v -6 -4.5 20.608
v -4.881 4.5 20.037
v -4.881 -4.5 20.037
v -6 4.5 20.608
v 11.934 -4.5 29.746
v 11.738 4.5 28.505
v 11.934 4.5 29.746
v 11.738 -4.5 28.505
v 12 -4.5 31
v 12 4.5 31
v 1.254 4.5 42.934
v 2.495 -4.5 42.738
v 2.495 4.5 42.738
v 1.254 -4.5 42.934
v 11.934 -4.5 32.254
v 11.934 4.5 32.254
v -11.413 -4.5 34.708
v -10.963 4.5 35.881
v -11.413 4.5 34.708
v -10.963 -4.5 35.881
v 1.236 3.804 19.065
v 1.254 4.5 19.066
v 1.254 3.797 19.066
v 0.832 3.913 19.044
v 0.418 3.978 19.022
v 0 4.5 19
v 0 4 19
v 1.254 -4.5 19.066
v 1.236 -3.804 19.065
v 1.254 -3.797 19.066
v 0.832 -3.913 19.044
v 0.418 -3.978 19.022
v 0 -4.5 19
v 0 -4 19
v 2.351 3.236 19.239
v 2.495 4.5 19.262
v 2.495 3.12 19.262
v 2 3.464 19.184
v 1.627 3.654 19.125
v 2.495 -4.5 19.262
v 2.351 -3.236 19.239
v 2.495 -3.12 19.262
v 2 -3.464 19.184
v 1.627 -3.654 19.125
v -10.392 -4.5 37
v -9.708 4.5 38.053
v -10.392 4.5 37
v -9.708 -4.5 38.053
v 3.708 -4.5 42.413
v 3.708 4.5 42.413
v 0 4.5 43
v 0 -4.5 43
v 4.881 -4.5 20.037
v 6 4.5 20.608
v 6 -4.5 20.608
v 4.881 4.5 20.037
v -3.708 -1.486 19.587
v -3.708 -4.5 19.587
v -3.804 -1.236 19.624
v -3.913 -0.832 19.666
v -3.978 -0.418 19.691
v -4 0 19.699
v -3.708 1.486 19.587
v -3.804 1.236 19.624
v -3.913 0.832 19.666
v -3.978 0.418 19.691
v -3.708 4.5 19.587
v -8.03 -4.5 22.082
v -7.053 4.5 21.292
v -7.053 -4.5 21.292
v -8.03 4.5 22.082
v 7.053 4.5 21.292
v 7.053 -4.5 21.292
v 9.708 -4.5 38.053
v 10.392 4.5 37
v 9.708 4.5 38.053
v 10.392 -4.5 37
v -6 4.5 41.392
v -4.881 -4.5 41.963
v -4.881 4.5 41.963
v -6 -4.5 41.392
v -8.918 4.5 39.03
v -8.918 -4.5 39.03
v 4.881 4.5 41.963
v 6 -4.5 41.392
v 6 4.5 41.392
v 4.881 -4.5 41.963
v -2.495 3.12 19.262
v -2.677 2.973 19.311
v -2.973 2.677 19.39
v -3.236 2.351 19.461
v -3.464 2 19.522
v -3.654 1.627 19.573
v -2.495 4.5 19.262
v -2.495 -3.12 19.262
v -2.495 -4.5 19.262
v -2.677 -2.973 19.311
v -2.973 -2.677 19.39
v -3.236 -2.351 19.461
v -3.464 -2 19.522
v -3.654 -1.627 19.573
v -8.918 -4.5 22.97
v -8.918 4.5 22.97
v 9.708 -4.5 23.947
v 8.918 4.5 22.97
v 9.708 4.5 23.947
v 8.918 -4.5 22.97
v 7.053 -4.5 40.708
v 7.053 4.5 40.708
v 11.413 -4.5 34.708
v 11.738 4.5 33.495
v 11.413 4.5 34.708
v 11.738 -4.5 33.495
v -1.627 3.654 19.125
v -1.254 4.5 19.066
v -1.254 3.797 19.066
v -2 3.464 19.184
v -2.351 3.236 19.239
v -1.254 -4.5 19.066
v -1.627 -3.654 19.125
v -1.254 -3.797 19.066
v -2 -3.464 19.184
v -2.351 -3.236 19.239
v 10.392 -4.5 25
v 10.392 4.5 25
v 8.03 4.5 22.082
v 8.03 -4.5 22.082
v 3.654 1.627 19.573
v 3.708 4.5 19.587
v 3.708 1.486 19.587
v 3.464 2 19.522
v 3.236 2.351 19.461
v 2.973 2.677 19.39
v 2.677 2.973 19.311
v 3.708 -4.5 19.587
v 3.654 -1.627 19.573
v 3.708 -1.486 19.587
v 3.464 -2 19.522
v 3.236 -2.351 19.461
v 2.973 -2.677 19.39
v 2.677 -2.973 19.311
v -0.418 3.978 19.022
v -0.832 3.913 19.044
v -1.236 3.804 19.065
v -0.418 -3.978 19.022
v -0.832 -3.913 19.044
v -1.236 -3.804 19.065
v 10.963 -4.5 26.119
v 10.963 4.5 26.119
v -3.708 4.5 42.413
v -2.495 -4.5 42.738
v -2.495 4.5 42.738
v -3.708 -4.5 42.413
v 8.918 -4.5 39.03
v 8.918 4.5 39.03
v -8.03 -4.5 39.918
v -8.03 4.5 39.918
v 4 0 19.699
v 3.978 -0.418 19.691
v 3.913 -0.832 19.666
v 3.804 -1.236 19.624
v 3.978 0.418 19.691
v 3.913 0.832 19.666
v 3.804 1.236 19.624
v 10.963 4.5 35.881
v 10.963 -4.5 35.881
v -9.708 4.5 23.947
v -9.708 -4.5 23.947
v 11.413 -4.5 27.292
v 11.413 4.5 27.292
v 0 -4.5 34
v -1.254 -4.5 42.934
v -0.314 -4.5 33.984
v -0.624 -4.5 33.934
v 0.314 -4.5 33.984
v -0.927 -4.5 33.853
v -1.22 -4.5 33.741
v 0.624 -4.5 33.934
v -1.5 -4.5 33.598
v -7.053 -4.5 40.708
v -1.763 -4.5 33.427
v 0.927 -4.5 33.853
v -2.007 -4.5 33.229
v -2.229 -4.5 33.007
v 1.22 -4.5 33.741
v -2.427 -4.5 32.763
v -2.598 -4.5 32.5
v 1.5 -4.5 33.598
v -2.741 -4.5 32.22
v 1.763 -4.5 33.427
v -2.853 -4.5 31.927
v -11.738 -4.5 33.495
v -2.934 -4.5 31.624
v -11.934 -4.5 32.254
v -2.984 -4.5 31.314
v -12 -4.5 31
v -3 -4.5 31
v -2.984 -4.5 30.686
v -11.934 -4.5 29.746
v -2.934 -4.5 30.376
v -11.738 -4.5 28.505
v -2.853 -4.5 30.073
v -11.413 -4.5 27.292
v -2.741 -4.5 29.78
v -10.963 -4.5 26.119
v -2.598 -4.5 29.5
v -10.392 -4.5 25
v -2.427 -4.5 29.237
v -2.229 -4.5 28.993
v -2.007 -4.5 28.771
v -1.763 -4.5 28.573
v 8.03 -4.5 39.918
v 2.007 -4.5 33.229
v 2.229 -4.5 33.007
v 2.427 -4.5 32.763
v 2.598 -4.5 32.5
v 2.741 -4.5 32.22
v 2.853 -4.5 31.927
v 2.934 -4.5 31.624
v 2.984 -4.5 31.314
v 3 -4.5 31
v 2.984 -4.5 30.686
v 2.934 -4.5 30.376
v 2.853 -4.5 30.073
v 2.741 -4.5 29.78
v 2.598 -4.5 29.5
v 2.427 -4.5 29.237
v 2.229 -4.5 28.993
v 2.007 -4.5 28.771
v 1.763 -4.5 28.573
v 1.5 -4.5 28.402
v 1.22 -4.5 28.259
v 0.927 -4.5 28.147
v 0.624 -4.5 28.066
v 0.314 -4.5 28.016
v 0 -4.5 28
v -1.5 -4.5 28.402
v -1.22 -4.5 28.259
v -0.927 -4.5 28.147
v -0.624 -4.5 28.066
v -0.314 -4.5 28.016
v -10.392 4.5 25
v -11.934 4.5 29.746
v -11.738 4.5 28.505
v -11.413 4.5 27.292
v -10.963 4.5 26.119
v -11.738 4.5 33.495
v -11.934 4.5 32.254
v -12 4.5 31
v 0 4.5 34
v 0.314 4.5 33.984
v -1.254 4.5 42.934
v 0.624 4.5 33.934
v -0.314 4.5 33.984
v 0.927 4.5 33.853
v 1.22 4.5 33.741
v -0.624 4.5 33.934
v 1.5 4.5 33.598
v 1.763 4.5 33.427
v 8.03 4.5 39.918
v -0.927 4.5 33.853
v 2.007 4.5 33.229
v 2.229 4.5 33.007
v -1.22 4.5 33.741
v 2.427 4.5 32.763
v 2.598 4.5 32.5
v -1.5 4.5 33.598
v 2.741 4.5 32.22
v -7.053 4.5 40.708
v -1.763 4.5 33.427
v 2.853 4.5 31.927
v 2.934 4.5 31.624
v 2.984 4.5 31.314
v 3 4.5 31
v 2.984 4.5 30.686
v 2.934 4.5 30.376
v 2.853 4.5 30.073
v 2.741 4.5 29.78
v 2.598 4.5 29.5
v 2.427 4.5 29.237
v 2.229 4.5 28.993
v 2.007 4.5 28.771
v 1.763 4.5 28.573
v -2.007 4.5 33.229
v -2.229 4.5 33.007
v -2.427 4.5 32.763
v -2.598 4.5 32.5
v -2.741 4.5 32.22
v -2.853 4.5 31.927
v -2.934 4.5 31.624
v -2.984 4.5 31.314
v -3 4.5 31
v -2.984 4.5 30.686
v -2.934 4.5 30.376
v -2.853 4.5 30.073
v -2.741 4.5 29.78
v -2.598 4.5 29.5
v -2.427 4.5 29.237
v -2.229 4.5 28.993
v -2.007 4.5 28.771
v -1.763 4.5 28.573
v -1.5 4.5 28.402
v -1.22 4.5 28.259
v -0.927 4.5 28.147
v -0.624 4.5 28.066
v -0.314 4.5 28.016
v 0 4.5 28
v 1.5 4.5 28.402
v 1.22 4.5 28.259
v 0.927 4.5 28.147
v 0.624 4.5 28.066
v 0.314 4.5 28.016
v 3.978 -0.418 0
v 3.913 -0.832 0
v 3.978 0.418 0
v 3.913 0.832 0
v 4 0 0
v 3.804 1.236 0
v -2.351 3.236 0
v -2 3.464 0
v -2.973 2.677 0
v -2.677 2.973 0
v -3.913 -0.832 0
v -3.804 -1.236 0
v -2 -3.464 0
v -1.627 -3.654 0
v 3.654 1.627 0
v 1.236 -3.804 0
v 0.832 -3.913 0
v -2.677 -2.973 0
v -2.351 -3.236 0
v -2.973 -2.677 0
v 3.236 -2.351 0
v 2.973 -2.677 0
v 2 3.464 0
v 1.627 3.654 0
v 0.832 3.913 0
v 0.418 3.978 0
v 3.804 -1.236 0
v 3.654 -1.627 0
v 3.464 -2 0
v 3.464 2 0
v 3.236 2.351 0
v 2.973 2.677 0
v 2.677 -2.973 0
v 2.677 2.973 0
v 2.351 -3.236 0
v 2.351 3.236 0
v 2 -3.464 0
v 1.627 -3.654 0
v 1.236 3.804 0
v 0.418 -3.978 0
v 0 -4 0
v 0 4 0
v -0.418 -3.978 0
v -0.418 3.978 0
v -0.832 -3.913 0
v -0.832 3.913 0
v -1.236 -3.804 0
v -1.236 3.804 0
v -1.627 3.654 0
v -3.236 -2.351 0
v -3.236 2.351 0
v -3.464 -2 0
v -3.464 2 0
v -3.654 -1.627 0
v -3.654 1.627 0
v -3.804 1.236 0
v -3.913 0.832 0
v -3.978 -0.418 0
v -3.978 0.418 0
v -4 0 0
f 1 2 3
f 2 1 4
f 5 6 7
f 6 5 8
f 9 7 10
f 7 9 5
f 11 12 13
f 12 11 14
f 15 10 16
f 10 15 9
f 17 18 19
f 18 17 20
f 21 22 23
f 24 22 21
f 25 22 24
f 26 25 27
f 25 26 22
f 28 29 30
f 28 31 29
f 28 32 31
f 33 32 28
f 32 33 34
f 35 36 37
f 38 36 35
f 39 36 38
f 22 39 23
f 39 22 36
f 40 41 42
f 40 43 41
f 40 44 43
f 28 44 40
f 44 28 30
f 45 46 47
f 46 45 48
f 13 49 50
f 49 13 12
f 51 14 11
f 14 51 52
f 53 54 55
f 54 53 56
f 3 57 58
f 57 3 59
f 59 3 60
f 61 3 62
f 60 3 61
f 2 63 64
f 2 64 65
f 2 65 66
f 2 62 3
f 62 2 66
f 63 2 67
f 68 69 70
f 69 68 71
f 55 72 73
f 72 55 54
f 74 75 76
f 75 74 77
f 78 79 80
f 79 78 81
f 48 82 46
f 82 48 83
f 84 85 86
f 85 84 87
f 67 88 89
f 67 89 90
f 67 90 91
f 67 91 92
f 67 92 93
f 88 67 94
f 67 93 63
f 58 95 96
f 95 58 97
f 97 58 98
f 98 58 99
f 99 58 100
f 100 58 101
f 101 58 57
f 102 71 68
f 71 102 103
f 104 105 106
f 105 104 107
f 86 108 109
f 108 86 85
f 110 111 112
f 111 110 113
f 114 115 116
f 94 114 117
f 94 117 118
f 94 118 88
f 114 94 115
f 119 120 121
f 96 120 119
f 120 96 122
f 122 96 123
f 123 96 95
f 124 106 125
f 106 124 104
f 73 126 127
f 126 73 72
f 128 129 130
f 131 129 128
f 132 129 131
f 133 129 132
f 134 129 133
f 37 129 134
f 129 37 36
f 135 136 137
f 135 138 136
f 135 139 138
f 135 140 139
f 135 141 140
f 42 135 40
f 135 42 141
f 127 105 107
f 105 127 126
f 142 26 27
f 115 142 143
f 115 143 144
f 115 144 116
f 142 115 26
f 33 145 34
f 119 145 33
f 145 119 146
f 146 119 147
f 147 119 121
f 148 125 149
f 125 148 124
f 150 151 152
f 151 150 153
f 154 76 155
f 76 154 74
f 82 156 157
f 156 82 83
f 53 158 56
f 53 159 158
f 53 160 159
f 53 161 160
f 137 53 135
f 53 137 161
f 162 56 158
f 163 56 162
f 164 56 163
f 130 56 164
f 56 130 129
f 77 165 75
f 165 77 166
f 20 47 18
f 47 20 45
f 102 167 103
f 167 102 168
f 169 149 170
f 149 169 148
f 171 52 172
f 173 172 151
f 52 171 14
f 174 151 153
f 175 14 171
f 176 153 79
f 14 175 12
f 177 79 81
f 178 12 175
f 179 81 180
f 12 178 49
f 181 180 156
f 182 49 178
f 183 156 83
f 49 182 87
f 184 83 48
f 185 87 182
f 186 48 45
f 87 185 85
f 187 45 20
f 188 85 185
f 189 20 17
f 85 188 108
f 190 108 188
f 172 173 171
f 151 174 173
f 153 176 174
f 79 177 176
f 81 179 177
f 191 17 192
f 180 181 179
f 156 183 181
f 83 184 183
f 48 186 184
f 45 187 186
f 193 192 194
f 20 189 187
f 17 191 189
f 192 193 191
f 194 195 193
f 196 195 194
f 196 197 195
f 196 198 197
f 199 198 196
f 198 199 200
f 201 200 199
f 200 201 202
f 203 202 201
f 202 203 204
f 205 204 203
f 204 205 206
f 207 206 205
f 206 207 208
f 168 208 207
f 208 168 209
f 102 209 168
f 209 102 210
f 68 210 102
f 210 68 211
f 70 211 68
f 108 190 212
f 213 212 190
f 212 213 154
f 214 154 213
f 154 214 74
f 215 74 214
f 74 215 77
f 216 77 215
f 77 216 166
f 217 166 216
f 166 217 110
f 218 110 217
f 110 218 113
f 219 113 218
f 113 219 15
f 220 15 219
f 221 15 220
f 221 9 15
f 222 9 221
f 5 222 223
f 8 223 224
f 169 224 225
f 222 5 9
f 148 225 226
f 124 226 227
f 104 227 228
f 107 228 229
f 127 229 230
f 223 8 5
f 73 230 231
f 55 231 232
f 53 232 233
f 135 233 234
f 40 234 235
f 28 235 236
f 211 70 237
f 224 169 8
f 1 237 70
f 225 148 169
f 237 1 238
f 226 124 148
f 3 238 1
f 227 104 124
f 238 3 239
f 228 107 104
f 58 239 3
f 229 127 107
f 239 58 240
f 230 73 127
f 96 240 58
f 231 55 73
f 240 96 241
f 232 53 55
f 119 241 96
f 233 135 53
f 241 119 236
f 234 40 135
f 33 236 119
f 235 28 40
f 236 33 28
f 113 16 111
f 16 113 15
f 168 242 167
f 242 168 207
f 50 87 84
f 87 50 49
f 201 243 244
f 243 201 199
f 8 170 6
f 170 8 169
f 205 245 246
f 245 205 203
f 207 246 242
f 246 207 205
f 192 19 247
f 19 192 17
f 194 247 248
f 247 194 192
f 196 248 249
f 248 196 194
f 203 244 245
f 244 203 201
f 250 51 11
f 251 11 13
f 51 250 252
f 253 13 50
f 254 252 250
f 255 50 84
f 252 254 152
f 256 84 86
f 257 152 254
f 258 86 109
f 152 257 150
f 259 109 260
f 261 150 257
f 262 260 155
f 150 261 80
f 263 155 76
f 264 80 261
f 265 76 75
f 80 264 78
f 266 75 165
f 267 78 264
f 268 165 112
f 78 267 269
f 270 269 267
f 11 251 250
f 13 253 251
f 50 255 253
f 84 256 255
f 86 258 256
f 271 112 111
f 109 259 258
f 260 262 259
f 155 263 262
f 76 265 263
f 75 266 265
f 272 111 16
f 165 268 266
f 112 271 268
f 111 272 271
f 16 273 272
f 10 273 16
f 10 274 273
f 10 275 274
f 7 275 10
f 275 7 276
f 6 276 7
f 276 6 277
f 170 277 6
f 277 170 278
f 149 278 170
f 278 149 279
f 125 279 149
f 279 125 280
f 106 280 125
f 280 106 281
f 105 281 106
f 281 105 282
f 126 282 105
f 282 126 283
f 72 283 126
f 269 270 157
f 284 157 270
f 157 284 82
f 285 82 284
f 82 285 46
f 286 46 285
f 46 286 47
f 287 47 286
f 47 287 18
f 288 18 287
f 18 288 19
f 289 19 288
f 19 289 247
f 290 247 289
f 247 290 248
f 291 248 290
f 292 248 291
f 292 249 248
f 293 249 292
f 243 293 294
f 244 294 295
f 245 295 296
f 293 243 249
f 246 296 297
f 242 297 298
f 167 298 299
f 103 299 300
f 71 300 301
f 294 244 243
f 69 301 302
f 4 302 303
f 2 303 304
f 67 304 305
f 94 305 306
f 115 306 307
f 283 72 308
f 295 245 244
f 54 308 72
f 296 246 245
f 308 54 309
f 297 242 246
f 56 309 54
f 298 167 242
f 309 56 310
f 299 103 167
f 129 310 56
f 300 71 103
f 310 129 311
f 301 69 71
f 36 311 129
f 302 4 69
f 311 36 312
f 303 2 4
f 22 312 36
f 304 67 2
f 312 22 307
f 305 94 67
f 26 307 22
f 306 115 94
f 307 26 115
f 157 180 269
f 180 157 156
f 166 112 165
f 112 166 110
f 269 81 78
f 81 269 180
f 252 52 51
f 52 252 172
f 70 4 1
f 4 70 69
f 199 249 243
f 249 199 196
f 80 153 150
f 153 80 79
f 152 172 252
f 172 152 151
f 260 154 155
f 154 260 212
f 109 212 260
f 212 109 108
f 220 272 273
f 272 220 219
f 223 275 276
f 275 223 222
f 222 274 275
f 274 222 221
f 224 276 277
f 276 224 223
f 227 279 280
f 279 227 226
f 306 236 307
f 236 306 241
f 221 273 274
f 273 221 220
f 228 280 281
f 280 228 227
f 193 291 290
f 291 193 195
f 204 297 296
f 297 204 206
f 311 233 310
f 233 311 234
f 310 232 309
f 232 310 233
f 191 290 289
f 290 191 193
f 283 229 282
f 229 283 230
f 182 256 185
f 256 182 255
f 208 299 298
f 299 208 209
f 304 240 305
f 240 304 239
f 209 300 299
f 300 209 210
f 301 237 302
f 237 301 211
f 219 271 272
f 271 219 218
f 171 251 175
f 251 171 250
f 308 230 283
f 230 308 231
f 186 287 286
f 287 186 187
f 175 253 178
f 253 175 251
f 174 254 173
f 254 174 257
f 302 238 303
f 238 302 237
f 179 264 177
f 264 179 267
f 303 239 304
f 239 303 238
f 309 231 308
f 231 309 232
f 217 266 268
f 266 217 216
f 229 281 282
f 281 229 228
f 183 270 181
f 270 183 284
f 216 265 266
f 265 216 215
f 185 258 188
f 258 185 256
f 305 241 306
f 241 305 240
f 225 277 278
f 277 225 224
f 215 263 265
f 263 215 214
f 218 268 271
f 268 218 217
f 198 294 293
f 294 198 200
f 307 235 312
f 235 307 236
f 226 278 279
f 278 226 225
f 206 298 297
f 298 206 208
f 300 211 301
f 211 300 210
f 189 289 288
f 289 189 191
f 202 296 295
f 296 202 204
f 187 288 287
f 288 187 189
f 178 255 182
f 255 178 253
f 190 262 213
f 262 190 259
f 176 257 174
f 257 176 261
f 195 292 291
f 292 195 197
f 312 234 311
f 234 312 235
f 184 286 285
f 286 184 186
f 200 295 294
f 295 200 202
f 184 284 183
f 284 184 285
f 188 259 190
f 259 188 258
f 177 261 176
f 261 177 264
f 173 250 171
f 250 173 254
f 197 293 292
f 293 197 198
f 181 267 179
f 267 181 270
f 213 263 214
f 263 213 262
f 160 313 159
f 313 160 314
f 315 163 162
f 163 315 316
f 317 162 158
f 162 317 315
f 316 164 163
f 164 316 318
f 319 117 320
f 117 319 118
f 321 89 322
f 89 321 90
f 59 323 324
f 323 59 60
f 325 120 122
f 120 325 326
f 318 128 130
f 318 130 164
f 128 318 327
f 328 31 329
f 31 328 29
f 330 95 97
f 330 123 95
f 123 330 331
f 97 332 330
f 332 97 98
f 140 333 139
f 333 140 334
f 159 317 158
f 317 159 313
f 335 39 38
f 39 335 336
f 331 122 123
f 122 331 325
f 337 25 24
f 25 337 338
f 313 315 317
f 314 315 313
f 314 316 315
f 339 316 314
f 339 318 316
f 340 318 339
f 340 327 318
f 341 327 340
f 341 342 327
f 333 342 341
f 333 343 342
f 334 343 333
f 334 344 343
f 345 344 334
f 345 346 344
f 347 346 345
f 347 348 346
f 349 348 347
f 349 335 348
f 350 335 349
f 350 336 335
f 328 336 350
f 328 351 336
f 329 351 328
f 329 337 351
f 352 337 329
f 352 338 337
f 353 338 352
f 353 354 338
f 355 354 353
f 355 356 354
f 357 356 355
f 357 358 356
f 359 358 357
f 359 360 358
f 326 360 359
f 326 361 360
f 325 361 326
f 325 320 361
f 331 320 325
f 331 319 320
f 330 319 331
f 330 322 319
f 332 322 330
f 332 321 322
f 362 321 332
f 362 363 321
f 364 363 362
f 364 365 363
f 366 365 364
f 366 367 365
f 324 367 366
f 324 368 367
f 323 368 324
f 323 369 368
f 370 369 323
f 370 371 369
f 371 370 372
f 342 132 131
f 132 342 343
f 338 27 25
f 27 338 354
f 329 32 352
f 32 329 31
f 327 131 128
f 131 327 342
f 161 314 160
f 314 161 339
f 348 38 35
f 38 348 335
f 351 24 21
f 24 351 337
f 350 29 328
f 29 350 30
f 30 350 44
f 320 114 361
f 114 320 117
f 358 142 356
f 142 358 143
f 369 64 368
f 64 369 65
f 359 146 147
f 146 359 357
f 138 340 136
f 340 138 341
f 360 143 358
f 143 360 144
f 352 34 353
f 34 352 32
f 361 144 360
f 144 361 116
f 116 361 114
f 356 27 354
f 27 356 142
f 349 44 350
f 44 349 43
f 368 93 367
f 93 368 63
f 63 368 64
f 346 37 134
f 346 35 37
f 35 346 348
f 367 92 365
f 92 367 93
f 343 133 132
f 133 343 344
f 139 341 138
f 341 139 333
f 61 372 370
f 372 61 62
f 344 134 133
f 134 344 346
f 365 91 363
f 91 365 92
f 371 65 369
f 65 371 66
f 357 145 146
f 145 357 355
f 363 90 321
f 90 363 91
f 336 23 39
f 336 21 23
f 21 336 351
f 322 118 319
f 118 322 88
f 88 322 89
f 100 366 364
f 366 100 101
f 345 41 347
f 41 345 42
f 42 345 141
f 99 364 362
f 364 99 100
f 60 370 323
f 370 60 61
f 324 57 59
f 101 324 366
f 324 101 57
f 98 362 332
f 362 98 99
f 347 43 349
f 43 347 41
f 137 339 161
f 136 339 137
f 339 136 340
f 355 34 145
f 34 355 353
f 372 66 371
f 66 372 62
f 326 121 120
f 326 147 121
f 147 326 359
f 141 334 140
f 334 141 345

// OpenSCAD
// Flat-eye bolt with a smooth shaft.
$fn = 60;
eps = 0.02;
shaft_d = 8;
shaft_l = 20;
eye_outer_d = 24;
eye_inner_d = eye_outer_d - 2 * 9;
eye_t = 9;
module eye() {
    translate([0, -eye_t / 2, shaft_l + eye_outer_d / 2 - 1]) rotate([-90, 0, 0])
        difference() { cylinder(d = eye_outer_d, h = eye_t); translate([0, 0, -eps]) cylinder(d = eye_inner_d, h = eye_t + 2 * eps); }
}
union() { cylinder(d = shaft_d, h = shaft_l + 2); eye(); }
